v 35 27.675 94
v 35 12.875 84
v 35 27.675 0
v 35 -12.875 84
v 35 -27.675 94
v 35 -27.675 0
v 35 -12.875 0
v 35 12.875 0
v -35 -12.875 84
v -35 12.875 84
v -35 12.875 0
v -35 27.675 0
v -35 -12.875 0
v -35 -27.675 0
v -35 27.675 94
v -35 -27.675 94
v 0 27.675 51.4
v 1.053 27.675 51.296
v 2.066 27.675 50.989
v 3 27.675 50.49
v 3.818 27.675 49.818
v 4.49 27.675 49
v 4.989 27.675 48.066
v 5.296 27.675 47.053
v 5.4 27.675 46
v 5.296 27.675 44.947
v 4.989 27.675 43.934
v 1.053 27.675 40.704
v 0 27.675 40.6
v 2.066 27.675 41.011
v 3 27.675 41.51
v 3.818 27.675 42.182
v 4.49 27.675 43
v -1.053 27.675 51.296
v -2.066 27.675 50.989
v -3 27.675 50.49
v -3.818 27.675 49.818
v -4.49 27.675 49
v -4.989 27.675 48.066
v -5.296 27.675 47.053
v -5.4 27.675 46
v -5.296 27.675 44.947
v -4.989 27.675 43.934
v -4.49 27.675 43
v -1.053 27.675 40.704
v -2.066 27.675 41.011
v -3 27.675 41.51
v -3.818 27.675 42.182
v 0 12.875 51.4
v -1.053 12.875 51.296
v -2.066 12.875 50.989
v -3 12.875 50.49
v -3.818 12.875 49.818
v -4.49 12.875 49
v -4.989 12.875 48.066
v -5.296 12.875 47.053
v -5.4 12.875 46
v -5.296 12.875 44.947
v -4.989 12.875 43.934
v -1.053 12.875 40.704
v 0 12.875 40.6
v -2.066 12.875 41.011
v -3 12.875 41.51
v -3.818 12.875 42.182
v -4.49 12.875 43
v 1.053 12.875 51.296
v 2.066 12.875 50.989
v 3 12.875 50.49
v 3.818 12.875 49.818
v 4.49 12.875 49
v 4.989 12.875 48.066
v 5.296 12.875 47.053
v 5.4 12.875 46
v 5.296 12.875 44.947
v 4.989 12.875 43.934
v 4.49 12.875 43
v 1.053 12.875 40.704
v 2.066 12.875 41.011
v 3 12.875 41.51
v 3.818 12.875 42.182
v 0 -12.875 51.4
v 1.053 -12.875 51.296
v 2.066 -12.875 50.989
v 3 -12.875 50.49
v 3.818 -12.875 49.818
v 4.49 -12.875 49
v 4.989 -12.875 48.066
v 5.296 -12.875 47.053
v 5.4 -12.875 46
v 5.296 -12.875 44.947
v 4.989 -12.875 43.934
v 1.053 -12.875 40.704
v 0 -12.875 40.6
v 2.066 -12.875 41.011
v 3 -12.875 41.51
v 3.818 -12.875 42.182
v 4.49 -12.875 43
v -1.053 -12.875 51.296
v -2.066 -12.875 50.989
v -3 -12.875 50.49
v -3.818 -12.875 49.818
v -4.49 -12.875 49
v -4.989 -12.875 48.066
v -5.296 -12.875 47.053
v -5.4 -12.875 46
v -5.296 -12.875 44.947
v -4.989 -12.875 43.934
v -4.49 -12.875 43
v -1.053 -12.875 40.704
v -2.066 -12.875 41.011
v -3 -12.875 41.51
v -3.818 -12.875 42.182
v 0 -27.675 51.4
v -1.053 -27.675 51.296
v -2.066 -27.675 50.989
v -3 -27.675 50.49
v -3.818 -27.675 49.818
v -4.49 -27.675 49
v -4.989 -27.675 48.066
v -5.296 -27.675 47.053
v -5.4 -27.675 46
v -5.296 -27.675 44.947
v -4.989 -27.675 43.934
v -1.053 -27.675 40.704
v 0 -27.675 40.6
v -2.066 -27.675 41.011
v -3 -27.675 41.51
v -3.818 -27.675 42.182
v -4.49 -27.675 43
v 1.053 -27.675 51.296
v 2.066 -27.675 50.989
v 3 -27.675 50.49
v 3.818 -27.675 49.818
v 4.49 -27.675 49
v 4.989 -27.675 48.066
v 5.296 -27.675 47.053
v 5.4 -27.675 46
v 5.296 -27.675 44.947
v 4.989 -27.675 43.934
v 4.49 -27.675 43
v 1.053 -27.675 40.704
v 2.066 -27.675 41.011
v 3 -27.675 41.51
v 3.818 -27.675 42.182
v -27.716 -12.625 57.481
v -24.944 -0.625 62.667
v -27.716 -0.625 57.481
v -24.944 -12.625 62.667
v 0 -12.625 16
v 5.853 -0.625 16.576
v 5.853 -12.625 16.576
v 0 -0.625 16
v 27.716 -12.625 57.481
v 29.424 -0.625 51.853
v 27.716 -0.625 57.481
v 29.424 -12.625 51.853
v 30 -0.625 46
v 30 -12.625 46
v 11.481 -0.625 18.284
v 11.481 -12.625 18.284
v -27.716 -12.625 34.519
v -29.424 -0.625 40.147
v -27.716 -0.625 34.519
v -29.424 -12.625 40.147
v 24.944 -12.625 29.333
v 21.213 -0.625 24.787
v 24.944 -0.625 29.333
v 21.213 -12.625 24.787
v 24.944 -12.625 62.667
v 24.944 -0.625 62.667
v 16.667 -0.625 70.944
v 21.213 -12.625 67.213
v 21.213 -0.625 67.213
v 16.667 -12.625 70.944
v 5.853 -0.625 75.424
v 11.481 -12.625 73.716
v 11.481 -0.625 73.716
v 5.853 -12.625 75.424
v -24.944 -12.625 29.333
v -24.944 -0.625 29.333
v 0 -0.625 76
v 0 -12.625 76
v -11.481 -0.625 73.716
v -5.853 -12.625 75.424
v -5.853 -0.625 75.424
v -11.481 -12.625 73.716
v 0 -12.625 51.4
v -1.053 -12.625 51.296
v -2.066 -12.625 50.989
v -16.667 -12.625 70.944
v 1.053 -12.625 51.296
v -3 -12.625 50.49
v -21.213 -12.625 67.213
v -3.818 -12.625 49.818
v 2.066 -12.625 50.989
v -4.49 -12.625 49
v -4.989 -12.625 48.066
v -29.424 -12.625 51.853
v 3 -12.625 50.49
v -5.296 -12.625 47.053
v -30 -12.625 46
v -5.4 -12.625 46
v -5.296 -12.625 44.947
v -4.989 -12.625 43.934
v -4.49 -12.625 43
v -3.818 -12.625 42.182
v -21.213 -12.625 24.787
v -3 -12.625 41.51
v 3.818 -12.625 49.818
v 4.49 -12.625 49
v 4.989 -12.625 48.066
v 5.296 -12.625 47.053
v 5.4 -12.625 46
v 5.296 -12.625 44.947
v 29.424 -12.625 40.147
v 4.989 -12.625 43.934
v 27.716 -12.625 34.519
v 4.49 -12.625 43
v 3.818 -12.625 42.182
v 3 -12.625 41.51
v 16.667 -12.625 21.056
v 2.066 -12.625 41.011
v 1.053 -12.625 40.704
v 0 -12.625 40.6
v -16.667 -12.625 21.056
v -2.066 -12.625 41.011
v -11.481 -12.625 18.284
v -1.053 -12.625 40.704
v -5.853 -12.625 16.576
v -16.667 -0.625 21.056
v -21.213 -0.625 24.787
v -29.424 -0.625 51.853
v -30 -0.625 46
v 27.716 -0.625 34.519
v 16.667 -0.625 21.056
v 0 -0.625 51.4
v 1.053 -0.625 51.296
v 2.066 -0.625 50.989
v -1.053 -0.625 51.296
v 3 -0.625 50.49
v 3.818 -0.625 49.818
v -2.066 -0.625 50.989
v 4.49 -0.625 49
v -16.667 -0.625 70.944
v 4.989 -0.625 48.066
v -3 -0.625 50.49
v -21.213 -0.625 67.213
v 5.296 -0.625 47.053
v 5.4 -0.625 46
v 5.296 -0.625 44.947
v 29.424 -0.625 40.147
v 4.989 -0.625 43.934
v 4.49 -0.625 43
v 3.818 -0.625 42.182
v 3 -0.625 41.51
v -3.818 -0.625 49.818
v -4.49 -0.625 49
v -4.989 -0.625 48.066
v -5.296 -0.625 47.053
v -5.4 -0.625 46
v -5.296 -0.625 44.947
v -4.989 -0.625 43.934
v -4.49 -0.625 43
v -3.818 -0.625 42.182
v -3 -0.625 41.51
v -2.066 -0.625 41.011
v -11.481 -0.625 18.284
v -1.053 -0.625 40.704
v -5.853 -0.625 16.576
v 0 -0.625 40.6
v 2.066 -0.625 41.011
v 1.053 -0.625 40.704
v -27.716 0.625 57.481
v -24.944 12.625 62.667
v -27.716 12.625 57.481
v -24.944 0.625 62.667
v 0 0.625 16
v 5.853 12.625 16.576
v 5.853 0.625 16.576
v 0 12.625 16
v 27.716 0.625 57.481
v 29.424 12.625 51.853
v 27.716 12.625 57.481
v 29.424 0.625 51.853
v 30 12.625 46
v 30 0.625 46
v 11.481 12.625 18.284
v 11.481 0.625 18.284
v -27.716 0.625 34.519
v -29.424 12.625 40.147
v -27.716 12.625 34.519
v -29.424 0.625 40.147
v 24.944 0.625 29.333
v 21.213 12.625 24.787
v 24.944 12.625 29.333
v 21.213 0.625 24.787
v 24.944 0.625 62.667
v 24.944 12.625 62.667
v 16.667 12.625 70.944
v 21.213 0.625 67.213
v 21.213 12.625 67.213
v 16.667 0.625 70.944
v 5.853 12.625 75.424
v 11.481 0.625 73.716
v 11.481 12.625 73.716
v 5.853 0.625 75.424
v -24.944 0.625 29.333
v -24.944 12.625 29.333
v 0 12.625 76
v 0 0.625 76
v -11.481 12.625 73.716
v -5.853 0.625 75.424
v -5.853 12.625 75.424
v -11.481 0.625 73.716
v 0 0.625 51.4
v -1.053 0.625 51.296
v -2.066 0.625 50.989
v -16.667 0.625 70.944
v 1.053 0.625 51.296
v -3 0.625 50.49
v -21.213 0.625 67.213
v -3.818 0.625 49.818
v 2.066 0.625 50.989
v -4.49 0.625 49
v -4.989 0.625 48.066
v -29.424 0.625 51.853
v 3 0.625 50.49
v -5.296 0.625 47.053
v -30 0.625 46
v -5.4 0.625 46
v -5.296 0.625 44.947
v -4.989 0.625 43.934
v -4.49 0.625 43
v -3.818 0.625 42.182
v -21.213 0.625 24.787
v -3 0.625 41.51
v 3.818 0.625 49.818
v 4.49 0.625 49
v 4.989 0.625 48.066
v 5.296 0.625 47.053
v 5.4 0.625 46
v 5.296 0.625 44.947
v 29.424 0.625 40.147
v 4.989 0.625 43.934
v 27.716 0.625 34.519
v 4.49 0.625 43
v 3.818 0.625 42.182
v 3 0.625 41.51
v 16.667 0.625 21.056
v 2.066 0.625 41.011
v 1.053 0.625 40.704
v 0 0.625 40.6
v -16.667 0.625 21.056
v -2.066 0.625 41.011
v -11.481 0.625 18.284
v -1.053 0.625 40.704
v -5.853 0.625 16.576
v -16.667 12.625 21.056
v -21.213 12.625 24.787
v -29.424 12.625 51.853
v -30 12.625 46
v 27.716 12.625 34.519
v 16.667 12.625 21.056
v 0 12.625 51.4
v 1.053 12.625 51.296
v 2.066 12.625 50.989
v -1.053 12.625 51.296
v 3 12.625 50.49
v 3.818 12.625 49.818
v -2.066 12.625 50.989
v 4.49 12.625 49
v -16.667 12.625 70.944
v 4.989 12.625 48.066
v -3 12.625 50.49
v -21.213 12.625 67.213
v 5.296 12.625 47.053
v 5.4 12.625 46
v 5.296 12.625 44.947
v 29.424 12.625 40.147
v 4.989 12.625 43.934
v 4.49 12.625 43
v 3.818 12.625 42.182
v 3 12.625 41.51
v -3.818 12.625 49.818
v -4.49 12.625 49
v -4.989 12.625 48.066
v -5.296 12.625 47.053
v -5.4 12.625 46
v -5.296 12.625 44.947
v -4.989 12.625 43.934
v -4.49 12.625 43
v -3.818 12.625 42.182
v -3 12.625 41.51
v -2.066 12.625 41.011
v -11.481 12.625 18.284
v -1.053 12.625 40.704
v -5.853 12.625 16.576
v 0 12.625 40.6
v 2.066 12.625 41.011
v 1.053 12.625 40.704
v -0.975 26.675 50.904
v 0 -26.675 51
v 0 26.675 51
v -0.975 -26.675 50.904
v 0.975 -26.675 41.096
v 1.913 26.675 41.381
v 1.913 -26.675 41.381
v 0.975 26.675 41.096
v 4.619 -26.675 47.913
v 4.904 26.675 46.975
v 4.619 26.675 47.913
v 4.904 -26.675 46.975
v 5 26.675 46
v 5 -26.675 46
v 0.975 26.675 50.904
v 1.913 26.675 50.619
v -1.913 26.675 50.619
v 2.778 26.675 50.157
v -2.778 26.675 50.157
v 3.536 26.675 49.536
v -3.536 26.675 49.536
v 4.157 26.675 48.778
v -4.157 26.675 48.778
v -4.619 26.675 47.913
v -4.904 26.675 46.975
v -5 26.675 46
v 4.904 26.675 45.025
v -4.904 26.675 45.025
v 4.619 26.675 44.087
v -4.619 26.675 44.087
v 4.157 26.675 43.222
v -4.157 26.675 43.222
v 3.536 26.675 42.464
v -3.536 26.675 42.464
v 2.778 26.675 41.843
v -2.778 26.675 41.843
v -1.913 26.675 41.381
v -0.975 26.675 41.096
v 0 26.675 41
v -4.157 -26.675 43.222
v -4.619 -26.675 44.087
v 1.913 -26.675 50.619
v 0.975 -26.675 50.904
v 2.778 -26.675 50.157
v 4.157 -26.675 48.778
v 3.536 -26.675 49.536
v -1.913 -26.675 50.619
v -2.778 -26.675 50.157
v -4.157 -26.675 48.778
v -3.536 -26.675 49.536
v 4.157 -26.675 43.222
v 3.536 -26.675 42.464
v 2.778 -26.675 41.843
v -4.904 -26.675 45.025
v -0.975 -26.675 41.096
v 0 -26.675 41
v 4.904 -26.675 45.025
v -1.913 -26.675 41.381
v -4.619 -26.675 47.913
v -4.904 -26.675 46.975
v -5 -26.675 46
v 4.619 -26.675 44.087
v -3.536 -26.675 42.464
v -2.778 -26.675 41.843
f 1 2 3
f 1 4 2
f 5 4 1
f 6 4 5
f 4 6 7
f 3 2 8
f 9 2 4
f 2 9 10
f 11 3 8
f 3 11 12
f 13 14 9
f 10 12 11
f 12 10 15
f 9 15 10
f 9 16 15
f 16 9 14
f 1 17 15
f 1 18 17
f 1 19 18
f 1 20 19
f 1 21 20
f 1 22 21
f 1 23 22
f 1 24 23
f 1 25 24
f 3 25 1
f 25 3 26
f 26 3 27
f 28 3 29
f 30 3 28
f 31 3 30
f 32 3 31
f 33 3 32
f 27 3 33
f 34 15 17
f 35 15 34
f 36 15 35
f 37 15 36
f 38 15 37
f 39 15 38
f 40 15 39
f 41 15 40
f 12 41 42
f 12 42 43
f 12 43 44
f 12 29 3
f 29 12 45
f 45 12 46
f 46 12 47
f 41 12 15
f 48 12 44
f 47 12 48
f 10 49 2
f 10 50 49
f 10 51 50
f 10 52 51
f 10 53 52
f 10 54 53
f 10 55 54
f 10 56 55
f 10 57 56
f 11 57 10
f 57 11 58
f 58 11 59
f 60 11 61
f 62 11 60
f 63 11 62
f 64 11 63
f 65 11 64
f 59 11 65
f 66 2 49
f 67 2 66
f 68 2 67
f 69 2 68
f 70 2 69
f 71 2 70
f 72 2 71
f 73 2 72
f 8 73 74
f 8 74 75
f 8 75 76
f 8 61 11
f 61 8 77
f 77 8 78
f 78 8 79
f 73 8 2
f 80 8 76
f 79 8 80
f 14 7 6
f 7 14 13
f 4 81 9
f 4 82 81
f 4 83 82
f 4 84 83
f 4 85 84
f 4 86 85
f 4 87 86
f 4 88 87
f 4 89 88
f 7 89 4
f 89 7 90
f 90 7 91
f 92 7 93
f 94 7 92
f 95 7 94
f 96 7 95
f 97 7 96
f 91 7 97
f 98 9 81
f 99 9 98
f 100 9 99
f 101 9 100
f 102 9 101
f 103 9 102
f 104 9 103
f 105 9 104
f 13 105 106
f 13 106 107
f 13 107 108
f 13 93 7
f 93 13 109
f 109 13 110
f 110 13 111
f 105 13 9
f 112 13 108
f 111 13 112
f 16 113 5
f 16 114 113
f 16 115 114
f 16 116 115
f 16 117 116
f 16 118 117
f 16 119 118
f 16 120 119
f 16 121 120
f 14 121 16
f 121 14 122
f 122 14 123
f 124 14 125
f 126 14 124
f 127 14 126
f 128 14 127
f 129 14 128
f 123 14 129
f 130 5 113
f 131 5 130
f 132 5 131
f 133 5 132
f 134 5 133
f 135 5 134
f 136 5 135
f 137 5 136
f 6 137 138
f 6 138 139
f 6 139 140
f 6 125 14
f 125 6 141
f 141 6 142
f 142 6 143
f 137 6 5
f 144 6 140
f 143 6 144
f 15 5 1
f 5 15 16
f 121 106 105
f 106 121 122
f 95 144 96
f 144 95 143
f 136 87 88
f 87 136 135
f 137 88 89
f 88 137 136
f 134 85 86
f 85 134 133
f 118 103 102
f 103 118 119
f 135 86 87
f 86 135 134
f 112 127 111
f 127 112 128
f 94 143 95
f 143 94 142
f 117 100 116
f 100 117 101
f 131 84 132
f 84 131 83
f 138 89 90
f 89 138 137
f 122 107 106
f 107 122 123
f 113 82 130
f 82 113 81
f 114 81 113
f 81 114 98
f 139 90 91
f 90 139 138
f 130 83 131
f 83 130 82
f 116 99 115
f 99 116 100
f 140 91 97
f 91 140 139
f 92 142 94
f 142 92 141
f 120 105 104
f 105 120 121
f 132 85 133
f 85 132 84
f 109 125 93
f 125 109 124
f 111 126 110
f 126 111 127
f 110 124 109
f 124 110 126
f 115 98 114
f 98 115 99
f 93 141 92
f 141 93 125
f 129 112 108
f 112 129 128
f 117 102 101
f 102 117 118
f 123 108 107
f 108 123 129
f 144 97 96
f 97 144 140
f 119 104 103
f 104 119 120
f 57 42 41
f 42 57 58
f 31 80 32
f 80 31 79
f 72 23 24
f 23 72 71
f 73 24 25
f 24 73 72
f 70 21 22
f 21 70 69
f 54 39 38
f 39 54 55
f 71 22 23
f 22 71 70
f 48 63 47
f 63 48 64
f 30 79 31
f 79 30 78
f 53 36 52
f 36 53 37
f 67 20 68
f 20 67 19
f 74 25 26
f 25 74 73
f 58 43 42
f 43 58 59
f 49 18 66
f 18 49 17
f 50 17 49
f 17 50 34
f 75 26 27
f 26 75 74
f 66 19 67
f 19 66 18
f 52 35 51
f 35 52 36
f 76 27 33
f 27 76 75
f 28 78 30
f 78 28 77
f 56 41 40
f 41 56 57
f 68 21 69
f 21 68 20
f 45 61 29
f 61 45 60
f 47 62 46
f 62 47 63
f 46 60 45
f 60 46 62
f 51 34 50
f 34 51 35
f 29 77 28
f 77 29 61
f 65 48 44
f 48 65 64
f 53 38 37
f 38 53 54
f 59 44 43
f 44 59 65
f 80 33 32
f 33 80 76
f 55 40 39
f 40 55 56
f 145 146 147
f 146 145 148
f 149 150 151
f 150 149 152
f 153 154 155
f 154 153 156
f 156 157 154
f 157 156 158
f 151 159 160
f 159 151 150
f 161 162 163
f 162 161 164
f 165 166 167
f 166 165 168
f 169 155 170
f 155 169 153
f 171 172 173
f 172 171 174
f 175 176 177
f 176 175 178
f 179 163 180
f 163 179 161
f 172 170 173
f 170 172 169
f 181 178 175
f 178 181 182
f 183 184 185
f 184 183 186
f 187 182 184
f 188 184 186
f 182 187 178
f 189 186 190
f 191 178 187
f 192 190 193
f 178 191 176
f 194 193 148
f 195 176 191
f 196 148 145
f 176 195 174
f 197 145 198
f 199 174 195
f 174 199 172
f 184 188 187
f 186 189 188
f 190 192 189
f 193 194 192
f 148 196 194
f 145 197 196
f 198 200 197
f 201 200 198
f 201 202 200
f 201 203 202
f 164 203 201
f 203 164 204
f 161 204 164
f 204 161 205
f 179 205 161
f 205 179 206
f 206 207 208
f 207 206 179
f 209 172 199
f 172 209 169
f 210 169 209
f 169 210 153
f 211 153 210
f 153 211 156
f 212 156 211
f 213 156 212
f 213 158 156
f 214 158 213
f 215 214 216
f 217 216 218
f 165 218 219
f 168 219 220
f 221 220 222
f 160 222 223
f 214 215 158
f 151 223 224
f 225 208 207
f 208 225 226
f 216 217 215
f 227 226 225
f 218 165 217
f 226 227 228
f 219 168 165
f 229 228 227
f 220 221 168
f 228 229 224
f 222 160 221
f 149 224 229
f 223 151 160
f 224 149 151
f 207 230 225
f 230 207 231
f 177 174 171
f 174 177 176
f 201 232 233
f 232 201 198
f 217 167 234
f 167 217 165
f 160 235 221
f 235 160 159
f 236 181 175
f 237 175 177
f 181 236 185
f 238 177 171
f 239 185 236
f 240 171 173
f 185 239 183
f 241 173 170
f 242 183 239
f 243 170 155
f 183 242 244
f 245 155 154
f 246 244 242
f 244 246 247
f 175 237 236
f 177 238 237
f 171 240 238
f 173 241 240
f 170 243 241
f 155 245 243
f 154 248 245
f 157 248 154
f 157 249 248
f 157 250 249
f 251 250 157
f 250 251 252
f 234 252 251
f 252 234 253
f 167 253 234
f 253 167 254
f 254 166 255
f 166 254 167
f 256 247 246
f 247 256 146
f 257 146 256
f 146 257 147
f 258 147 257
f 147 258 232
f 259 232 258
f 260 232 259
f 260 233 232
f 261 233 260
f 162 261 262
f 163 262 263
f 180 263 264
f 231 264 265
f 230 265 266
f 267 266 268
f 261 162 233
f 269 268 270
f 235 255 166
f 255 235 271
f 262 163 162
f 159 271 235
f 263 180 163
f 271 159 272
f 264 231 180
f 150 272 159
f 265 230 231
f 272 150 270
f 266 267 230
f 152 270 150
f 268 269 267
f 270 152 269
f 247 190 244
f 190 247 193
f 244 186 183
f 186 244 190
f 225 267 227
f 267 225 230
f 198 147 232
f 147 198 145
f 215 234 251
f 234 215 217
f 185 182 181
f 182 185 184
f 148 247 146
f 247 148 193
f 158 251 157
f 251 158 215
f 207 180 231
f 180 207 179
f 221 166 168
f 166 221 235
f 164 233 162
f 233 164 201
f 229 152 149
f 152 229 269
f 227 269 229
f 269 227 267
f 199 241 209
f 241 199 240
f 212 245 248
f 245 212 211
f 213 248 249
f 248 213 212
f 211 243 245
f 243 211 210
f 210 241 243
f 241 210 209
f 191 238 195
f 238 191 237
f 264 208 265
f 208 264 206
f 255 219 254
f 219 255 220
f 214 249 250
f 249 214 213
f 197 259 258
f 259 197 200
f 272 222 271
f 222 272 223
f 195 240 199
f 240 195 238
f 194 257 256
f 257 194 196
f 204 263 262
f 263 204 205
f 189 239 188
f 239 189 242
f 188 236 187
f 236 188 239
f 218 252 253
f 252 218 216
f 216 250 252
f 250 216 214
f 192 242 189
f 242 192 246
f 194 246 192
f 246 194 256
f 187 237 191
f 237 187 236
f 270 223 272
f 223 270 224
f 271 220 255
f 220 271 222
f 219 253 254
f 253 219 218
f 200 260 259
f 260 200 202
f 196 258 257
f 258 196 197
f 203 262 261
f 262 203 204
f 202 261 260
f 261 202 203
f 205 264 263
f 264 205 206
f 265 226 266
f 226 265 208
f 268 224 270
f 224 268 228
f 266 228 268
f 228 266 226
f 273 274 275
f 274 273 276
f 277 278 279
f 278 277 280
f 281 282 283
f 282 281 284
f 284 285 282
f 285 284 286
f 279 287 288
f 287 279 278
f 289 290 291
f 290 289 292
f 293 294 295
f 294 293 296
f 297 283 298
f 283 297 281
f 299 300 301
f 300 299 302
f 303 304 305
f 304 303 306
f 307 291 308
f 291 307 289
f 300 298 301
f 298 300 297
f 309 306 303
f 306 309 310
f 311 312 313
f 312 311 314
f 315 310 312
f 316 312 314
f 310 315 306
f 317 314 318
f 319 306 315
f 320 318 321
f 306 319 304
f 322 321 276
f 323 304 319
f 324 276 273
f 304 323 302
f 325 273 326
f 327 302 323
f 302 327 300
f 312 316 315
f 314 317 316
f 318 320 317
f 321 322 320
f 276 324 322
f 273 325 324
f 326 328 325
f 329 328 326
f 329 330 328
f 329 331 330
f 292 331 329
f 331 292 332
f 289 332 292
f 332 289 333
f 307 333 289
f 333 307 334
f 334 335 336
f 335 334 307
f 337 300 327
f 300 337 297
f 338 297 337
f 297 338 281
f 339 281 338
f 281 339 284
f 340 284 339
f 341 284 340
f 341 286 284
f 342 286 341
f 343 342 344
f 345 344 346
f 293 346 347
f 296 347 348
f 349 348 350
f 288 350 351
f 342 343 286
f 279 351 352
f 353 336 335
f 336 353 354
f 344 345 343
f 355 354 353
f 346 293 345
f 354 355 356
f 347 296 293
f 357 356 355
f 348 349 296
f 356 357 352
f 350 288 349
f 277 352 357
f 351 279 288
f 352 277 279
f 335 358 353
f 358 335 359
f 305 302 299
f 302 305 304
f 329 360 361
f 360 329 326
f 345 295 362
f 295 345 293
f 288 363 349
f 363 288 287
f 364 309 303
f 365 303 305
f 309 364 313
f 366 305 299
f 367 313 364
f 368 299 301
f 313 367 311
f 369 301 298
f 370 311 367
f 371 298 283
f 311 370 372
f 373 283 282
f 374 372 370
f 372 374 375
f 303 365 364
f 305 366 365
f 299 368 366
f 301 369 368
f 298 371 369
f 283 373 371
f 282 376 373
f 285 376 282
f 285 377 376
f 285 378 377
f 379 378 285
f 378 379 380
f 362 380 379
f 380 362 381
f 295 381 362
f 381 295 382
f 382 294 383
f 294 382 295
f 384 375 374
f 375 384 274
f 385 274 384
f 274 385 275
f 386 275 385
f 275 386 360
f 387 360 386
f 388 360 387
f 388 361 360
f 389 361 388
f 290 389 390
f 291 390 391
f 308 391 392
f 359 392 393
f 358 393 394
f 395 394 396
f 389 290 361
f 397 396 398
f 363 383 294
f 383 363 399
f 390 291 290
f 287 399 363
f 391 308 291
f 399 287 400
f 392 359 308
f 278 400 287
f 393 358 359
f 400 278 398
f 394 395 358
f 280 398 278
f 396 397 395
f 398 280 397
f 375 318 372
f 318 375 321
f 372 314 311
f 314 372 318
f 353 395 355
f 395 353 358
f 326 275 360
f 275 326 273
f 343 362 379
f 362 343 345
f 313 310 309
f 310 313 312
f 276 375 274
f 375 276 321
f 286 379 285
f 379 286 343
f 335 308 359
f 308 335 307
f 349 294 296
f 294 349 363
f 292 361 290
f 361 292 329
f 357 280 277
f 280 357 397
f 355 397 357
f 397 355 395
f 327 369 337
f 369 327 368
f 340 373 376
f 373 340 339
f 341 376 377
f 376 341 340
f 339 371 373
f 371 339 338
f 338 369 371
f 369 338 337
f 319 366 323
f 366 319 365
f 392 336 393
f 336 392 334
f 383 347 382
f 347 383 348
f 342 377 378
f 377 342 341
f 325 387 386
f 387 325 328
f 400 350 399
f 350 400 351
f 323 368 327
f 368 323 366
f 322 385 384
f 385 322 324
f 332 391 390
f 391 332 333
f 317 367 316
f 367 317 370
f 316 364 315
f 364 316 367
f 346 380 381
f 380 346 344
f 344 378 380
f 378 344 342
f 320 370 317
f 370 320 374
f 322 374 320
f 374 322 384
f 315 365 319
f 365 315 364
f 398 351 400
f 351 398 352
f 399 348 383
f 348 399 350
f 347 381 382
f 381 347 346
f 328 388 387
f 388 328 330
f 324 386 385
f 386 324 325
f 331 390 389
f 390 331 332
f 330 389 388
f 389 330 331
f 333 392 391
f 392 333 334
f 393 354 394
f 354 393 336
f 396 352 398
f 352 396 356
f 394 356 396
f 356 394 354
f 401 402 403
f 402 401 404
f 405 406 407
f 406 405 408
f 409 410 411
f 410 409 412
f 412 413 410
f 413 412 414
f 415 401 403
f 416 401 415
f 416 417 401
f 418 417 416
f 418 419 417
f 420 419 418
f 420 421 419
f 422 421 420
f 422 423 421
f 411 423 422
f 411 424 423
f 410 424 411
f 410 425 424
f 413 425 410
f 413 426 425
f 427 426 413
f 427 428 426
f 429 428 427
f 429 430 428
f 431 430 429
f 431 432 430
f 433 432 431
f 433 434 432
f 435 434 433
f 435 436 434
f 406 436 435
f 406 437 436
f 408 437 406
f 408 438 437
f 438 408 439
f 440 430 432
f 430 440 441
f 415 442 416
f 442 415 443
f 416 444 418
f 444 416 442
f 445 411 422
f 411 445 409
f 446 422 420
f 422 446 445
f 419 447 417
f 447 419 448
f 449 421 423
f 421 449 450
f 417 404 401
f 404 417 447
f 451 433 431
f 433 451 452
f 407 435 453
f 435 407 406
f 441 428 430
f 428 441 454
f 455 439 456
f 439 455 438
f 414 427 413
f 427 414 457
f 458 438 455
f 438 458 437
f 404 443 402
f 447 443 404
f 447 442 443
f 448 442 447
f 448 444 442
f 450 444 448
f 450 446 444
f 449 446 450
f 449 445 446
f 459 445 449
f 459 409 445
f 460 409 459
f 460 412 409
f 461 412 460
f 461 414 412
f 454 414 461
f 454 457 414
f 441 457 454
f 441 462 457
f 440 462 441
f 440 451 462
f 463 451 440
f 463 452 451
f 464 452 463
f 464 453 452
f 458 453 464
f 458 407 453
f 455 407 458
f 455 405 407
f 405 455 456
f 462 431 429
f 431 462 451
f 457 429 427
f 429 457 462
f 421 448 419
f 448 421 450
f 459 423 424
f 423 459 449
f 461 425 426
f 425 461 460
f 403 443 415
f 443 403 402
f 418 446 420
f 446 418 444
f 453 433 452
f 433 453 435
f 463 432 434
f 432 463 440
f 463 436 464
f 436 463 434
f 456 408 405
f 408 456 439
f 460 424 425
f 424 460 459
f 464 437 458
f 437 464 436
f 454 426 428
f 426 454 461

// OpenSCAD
$fn = 32;

// ------------------------------------------------------------------------
// Trolley wheel set: wheels d60, fork 84 mm tall
// Every part is its own module, assembly() places every instance.
// ------------------------------------------------------------------------

// --- part 1 ---
module trolley_fork() {
  difference() {
    union() {
      translate([-35, 12.875, 0]) cube([70, 14.8, 84]);
      translate([-35, -27.675, 0]) cube([70, 14.8, 84]);
      translate([-35, -27.675, 84]) cube([70, 55.35, 10]);
    }
    translate([0, -20.275, 46]) rotate([90, 0, 0]) cylinder(h = 16.8, d = 10.8, center = true);
    translate([0, 20.275, 46]) rotate([90, 0, 0]) cylinder(h = 16.8, d = 10.8, center = true);
  }
}

// --- part 2 ---
module trolley_wheel() {
  difference() {
      translate([0, 0, 0]) cylinder(h = 12, d = 60);
      translate([0, 0, -1]) cylinder(h = 14, d = 10.8);
    }
}

// --- part 3 ---
module trolley_axle() {
  translate([0, 0, -26.675]) cylinder(h = 53.35, d = 10);
}

// --- assembly ---
module assembly() {
  color([0.80, 0.24, 0.20]) translate([0, 0, 0]) rotate([0, 0, 0]) trolley_fork();
  color([0.20, 0.45, 0.75]) translate([0, -0.625, 46]) rotate([90, 0, 0]) trolley_wheel();
  color([0.25, 0.62, 0.32]) translate([0, 12.625, 46]) rotate([90, 0, 0]) trolley_wheel();
  color([0.92, 0.70, 0.18]) translate([0, 0, 46]) rotate([90, 0, 0]) trolley_axle();
}

assembly();
